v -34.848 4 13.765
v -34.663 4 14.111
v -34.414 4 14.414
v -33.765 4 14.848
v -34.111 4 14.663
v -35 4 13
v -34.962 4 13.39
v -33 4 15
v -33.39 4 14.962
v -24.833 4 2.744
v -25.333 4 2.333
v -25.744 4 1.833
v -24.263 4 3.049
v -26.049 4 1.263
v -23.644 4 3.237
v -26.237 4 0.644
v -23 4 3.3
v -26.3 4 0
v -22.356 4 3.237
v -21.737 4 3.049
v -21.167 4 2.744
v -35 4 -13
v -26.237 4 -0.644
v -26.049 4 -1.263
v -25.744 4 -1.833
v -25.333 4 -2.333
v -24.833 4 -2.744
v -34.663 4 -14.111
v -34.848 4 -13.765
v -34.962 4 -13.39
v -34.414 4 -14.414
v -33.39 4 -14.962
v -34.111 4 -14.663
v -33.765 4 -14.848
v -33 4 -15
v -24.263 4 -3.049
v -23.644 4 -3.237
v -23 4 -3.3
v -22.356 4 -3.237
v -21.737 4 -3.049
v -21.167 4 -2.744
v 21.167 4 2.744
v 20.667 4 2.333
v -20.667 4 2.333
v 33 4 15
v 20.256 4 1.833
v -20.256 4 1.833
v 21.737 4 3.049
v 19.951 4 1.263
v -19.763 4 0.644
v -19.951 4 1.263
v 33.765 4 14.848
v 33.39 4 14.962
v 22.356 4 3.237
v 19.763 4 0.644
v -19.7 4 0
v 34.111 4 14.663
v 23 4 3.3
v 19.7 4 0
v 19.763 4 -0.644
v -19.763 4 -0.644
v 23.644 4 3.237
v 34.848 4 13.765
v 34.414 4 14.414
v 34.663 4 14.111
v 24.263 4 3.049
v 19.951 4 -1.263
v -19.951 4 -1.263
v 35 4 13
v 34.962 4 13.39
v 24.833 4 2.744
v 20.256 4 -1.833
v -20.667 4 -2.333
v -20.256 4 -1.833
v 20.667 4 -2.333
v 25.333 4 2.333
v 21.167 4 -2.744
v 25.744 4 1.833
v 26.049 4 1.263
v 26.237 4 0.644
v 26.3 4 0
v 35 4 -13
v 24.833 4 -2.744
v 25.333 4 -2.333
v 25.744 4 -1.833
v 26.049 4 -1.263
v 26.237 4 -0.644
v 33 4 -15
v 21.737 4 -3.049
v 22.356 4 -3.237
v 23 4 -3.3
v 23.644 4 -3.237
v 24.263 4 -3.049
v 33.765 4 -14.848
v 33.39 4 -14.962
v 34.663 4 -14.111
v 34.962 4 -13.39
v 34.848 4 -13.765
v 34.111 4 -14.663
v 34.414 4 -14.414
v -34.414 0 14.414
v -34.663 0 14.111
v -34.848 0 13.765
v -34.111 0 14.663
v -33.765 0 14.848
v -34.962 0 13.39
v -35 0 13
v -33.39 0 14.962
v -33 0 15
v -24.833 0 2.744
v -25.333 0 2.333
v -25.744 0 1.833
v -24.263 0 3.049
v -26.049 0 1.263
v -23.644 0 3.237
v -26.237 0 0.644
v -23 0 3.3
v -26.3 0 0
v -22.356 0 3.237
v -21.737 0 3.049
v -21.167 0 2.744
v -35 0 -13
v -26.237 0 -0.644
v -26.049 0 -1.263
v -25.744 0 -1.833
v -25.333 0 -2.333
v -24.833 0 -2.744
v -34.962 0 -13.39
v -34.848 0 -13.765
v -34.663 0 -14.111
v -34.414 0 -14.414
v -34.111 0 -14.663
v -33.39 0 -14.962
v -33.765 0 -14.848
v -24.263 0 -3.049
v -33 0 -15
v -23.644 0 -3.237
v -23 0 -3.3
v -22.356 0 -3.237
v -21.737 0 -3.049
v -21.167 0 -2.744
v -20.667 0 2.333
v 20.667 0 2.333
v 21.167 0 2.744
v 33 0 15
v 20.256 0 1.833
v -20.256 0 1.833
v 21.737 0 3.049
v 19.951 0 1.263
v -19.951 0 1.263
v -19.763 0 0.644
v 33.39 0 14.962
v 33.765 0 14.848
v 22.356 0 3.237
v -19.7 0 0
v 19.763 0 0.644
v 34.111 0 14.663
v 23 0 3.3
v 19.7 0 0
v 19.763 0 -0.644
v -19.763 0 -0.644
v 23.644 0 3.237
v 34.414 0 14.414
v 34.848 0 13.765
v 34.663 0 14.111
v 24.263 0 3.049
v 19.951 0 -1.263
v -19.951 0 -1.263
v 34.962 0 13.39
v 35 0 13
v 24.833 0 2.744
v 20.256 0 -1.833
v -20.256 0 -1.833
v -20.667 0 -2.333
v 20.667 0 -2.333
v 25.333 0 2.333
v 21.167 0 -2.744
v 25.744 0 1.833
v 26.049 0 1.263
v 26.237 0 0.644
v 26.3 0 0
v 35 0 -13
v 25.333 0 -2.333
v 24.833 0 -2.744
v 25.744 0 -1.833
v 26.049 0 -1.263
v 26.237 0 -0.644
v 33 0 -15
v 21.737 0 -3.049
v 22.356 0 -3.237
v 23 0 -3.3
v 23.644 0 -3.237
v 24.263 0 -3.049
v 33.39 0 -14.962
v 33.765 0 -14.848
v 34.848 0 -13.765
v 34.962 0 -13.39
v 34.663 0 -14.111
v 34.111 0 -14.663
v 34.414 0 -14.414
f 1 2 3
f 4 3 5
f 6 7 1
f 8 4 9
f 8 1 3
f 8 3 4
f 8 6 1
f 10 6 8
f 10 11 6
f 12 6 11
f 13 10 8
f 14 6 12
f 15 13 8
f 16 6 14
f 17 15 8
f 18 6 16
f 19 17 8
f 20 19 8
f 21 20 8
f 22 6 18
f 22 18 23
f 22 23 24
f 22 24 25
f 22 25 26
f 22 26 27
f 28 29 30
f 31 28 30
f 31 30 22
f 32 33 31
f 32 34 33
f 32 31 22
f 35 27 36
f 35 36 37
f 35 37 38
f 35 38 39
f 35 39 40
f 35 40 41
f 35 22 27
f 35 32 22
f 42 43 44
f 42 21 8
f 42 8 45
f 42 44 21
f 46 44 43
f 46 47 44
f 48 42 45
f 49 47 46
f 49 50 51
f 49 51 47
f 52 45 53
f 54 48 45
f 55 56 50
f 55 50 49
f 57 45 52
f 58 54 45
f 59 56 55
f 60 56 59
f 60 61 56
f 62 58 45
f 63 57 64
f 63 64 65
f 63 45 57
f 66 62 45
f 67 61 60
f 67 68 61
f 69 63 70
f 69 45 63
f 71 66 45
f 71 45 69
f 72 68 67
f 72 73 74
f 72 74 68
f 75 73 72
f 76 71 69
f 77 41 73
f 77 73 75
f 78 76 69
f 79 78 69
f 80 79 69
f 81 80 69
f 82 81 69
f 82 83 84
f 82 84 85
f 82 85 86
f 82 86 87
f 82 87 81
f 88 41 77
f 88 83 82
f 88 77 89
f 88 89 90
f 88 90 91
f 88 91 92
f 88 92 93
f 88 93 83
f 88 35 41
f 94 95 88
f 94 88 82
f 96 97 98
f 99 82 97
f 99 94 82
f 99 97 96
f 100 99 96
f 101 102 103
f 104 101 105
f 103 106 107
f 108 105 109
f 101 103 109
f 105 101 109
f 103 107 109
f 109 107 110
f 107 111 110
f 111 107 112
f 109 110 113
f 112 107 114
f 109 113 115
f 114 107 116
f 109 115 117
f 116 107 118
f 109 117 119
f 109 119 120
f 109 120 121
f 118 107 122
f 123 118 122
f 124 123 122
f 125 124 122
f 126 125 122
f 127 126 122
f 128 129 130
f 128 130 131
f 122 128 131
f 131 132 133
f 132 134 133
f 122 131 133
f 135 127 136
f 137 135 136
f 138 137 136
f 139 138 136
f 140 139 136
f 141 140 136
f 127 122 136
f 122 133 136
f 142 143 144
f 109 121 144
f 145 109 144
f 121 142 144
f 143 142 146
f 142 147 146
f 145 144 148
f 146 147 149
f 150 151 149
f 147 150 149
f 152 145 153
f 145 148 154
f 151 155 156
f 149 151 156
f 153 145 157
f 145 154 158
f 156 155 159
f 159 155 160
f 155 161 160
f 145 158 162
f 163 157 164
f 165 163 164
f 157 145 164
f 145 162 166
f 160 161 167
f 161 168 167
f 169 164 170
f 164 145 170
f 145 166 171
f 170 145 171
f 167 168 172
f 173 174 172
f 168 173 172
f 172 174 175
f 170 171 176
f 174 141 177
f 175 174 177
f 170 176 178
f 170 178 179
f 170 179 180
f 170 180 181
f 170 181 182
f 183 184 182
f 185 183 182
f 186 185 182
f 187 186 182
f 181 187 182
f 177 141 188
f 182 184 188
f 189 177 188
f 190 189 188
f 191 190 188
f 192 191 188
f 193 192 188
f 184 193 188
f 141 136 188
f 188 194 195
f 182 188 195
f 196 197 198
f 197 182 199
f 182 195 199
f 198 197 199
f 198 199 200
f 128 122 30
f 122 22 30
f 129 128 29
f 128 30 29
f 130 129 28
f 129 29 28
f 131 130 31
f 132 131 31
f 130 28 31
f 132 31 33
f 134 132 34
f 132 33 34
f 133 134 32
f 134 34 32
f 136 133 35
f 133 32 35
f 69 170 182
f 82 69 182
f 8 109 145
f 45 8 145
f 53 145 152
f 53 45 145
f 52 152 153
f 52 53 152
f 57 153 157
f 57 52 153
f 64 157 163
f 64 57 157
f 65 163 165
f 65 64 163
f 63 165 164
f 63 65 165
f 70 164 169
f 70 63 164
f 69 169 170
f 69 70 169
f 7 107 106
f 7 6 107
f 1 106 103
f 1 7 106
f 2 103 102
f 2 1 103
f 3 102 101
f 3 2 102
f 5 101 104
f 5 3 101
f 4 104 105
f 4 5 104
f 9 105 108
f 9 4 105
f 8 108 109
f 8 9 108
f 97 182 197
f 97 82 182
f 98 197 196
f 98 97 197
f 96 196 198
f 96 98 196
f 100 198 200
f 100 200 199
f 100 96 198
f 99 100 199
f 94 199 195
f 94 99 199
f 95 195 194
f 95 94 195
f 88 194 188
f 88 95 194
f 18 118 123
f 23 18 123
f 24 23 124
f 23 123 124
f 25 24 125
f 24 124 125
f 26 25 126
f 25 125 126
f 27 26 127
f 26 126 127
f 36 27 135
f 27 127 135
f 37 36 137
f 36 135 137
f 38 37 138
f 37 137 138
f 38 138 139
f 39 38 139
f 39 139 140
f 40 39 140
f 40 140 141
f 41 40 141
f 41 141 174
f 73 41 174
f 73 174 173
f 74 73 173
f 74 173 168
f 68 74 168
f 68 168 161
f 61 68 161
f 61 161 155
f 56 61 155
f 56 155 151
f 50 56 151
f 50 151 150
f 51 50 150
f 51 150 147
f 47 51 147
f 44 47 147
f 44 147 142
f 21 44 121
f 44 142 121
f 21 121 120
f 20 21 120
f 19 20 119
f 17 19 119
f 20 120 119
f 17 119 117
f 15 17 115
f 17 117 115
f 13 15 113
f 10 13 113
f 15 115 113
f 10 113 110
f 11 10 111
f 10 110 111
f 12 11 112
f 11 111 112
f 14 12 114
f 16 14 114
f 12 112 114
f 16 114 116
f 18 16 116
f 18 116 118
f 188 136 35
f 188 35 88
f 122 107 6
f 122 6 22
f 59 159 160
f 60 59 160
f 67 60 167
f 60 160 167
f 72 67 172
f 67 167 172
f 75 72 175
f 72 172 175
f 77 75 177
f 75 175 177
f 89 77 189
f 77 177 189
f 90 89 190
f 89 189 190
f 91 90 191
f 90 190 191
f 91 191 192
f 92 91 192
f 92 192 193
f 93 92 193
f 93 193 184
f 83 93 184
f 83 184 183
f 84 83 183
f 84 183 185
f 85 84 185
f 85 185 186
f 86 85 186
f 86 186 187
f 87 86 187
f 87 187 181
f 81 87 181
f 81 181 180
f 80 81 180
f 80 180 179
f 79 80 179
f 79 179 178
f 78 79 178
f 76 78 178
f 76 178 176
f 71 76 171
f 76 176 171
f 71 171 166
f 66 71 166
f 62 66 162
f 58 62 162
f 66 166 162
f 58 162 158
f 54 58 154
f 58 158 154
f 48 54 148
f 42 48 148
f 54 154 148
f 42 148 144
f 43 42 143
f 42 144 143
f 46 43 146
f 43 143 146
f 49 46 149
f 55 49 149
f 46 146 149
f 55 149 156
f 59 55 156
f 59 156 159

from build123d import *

# Parameters (mm, degrees)
SKETCH1_W                = 70
SKETCH1_H                = 30
BOSS_EXTRUDE1_DEPTH      = 4
FILLET1_R                = 2
M6_CLEARANCE_HOLE1_D     = 6.6
M6_CLEARANCE_HOLE1_DEPTH = 7
M6_CLEARANCE_HOLE1_TIP   = 1.982840043


with BuildPart() as part:
    # Sketch1 → Boss-Extrude1 (new body)
    with BuildSketch(Plane(origin=(0, 0, 0), x_dir=(1, 0, 0), z_dir=(0, 1, 0))):
        Rectangle(SKETCH1_W, SKETCH1_H)
    extrude(amount=BOSS_EXTRUDE1_DEPTH)

    # Fillet1
    fillet1_edges = [part.edges().sort_by_distance(p)[0] for p in [
        (-35, 2, -15),
        (35, 2, -15),
        (35, 2, 15),
        (-35, 2, 15),
    ]]
    fillet(fillet1_edges, radius=FILLET1_R)

    # M6 Clearance Hole1
    with Locations(Plane(origin=(0, 4, 0), x_dir=(1, 0, 0), z_dir=(0, 1, 0))):
        with Locations((-23, 0), (23, 0)):
            Hole(M6_CLEARANCE_HOLE1_D / 2, depth=M6_CLEARANCE_HOLE1_DEPTH)
            with Locations((0, 0, -(M6_CLEARANCE_HOLE1_DEPTH + M6_CLEARANCE_HOLE1_TIP / 2))):  # 118° drill point
                Cone(0, M6_CLEARANCE_HOLE1_D / 2, M6_CLEARANCE_HOLE1_TIP, mode=Mode.SUBTRACT)


solid = part.part
